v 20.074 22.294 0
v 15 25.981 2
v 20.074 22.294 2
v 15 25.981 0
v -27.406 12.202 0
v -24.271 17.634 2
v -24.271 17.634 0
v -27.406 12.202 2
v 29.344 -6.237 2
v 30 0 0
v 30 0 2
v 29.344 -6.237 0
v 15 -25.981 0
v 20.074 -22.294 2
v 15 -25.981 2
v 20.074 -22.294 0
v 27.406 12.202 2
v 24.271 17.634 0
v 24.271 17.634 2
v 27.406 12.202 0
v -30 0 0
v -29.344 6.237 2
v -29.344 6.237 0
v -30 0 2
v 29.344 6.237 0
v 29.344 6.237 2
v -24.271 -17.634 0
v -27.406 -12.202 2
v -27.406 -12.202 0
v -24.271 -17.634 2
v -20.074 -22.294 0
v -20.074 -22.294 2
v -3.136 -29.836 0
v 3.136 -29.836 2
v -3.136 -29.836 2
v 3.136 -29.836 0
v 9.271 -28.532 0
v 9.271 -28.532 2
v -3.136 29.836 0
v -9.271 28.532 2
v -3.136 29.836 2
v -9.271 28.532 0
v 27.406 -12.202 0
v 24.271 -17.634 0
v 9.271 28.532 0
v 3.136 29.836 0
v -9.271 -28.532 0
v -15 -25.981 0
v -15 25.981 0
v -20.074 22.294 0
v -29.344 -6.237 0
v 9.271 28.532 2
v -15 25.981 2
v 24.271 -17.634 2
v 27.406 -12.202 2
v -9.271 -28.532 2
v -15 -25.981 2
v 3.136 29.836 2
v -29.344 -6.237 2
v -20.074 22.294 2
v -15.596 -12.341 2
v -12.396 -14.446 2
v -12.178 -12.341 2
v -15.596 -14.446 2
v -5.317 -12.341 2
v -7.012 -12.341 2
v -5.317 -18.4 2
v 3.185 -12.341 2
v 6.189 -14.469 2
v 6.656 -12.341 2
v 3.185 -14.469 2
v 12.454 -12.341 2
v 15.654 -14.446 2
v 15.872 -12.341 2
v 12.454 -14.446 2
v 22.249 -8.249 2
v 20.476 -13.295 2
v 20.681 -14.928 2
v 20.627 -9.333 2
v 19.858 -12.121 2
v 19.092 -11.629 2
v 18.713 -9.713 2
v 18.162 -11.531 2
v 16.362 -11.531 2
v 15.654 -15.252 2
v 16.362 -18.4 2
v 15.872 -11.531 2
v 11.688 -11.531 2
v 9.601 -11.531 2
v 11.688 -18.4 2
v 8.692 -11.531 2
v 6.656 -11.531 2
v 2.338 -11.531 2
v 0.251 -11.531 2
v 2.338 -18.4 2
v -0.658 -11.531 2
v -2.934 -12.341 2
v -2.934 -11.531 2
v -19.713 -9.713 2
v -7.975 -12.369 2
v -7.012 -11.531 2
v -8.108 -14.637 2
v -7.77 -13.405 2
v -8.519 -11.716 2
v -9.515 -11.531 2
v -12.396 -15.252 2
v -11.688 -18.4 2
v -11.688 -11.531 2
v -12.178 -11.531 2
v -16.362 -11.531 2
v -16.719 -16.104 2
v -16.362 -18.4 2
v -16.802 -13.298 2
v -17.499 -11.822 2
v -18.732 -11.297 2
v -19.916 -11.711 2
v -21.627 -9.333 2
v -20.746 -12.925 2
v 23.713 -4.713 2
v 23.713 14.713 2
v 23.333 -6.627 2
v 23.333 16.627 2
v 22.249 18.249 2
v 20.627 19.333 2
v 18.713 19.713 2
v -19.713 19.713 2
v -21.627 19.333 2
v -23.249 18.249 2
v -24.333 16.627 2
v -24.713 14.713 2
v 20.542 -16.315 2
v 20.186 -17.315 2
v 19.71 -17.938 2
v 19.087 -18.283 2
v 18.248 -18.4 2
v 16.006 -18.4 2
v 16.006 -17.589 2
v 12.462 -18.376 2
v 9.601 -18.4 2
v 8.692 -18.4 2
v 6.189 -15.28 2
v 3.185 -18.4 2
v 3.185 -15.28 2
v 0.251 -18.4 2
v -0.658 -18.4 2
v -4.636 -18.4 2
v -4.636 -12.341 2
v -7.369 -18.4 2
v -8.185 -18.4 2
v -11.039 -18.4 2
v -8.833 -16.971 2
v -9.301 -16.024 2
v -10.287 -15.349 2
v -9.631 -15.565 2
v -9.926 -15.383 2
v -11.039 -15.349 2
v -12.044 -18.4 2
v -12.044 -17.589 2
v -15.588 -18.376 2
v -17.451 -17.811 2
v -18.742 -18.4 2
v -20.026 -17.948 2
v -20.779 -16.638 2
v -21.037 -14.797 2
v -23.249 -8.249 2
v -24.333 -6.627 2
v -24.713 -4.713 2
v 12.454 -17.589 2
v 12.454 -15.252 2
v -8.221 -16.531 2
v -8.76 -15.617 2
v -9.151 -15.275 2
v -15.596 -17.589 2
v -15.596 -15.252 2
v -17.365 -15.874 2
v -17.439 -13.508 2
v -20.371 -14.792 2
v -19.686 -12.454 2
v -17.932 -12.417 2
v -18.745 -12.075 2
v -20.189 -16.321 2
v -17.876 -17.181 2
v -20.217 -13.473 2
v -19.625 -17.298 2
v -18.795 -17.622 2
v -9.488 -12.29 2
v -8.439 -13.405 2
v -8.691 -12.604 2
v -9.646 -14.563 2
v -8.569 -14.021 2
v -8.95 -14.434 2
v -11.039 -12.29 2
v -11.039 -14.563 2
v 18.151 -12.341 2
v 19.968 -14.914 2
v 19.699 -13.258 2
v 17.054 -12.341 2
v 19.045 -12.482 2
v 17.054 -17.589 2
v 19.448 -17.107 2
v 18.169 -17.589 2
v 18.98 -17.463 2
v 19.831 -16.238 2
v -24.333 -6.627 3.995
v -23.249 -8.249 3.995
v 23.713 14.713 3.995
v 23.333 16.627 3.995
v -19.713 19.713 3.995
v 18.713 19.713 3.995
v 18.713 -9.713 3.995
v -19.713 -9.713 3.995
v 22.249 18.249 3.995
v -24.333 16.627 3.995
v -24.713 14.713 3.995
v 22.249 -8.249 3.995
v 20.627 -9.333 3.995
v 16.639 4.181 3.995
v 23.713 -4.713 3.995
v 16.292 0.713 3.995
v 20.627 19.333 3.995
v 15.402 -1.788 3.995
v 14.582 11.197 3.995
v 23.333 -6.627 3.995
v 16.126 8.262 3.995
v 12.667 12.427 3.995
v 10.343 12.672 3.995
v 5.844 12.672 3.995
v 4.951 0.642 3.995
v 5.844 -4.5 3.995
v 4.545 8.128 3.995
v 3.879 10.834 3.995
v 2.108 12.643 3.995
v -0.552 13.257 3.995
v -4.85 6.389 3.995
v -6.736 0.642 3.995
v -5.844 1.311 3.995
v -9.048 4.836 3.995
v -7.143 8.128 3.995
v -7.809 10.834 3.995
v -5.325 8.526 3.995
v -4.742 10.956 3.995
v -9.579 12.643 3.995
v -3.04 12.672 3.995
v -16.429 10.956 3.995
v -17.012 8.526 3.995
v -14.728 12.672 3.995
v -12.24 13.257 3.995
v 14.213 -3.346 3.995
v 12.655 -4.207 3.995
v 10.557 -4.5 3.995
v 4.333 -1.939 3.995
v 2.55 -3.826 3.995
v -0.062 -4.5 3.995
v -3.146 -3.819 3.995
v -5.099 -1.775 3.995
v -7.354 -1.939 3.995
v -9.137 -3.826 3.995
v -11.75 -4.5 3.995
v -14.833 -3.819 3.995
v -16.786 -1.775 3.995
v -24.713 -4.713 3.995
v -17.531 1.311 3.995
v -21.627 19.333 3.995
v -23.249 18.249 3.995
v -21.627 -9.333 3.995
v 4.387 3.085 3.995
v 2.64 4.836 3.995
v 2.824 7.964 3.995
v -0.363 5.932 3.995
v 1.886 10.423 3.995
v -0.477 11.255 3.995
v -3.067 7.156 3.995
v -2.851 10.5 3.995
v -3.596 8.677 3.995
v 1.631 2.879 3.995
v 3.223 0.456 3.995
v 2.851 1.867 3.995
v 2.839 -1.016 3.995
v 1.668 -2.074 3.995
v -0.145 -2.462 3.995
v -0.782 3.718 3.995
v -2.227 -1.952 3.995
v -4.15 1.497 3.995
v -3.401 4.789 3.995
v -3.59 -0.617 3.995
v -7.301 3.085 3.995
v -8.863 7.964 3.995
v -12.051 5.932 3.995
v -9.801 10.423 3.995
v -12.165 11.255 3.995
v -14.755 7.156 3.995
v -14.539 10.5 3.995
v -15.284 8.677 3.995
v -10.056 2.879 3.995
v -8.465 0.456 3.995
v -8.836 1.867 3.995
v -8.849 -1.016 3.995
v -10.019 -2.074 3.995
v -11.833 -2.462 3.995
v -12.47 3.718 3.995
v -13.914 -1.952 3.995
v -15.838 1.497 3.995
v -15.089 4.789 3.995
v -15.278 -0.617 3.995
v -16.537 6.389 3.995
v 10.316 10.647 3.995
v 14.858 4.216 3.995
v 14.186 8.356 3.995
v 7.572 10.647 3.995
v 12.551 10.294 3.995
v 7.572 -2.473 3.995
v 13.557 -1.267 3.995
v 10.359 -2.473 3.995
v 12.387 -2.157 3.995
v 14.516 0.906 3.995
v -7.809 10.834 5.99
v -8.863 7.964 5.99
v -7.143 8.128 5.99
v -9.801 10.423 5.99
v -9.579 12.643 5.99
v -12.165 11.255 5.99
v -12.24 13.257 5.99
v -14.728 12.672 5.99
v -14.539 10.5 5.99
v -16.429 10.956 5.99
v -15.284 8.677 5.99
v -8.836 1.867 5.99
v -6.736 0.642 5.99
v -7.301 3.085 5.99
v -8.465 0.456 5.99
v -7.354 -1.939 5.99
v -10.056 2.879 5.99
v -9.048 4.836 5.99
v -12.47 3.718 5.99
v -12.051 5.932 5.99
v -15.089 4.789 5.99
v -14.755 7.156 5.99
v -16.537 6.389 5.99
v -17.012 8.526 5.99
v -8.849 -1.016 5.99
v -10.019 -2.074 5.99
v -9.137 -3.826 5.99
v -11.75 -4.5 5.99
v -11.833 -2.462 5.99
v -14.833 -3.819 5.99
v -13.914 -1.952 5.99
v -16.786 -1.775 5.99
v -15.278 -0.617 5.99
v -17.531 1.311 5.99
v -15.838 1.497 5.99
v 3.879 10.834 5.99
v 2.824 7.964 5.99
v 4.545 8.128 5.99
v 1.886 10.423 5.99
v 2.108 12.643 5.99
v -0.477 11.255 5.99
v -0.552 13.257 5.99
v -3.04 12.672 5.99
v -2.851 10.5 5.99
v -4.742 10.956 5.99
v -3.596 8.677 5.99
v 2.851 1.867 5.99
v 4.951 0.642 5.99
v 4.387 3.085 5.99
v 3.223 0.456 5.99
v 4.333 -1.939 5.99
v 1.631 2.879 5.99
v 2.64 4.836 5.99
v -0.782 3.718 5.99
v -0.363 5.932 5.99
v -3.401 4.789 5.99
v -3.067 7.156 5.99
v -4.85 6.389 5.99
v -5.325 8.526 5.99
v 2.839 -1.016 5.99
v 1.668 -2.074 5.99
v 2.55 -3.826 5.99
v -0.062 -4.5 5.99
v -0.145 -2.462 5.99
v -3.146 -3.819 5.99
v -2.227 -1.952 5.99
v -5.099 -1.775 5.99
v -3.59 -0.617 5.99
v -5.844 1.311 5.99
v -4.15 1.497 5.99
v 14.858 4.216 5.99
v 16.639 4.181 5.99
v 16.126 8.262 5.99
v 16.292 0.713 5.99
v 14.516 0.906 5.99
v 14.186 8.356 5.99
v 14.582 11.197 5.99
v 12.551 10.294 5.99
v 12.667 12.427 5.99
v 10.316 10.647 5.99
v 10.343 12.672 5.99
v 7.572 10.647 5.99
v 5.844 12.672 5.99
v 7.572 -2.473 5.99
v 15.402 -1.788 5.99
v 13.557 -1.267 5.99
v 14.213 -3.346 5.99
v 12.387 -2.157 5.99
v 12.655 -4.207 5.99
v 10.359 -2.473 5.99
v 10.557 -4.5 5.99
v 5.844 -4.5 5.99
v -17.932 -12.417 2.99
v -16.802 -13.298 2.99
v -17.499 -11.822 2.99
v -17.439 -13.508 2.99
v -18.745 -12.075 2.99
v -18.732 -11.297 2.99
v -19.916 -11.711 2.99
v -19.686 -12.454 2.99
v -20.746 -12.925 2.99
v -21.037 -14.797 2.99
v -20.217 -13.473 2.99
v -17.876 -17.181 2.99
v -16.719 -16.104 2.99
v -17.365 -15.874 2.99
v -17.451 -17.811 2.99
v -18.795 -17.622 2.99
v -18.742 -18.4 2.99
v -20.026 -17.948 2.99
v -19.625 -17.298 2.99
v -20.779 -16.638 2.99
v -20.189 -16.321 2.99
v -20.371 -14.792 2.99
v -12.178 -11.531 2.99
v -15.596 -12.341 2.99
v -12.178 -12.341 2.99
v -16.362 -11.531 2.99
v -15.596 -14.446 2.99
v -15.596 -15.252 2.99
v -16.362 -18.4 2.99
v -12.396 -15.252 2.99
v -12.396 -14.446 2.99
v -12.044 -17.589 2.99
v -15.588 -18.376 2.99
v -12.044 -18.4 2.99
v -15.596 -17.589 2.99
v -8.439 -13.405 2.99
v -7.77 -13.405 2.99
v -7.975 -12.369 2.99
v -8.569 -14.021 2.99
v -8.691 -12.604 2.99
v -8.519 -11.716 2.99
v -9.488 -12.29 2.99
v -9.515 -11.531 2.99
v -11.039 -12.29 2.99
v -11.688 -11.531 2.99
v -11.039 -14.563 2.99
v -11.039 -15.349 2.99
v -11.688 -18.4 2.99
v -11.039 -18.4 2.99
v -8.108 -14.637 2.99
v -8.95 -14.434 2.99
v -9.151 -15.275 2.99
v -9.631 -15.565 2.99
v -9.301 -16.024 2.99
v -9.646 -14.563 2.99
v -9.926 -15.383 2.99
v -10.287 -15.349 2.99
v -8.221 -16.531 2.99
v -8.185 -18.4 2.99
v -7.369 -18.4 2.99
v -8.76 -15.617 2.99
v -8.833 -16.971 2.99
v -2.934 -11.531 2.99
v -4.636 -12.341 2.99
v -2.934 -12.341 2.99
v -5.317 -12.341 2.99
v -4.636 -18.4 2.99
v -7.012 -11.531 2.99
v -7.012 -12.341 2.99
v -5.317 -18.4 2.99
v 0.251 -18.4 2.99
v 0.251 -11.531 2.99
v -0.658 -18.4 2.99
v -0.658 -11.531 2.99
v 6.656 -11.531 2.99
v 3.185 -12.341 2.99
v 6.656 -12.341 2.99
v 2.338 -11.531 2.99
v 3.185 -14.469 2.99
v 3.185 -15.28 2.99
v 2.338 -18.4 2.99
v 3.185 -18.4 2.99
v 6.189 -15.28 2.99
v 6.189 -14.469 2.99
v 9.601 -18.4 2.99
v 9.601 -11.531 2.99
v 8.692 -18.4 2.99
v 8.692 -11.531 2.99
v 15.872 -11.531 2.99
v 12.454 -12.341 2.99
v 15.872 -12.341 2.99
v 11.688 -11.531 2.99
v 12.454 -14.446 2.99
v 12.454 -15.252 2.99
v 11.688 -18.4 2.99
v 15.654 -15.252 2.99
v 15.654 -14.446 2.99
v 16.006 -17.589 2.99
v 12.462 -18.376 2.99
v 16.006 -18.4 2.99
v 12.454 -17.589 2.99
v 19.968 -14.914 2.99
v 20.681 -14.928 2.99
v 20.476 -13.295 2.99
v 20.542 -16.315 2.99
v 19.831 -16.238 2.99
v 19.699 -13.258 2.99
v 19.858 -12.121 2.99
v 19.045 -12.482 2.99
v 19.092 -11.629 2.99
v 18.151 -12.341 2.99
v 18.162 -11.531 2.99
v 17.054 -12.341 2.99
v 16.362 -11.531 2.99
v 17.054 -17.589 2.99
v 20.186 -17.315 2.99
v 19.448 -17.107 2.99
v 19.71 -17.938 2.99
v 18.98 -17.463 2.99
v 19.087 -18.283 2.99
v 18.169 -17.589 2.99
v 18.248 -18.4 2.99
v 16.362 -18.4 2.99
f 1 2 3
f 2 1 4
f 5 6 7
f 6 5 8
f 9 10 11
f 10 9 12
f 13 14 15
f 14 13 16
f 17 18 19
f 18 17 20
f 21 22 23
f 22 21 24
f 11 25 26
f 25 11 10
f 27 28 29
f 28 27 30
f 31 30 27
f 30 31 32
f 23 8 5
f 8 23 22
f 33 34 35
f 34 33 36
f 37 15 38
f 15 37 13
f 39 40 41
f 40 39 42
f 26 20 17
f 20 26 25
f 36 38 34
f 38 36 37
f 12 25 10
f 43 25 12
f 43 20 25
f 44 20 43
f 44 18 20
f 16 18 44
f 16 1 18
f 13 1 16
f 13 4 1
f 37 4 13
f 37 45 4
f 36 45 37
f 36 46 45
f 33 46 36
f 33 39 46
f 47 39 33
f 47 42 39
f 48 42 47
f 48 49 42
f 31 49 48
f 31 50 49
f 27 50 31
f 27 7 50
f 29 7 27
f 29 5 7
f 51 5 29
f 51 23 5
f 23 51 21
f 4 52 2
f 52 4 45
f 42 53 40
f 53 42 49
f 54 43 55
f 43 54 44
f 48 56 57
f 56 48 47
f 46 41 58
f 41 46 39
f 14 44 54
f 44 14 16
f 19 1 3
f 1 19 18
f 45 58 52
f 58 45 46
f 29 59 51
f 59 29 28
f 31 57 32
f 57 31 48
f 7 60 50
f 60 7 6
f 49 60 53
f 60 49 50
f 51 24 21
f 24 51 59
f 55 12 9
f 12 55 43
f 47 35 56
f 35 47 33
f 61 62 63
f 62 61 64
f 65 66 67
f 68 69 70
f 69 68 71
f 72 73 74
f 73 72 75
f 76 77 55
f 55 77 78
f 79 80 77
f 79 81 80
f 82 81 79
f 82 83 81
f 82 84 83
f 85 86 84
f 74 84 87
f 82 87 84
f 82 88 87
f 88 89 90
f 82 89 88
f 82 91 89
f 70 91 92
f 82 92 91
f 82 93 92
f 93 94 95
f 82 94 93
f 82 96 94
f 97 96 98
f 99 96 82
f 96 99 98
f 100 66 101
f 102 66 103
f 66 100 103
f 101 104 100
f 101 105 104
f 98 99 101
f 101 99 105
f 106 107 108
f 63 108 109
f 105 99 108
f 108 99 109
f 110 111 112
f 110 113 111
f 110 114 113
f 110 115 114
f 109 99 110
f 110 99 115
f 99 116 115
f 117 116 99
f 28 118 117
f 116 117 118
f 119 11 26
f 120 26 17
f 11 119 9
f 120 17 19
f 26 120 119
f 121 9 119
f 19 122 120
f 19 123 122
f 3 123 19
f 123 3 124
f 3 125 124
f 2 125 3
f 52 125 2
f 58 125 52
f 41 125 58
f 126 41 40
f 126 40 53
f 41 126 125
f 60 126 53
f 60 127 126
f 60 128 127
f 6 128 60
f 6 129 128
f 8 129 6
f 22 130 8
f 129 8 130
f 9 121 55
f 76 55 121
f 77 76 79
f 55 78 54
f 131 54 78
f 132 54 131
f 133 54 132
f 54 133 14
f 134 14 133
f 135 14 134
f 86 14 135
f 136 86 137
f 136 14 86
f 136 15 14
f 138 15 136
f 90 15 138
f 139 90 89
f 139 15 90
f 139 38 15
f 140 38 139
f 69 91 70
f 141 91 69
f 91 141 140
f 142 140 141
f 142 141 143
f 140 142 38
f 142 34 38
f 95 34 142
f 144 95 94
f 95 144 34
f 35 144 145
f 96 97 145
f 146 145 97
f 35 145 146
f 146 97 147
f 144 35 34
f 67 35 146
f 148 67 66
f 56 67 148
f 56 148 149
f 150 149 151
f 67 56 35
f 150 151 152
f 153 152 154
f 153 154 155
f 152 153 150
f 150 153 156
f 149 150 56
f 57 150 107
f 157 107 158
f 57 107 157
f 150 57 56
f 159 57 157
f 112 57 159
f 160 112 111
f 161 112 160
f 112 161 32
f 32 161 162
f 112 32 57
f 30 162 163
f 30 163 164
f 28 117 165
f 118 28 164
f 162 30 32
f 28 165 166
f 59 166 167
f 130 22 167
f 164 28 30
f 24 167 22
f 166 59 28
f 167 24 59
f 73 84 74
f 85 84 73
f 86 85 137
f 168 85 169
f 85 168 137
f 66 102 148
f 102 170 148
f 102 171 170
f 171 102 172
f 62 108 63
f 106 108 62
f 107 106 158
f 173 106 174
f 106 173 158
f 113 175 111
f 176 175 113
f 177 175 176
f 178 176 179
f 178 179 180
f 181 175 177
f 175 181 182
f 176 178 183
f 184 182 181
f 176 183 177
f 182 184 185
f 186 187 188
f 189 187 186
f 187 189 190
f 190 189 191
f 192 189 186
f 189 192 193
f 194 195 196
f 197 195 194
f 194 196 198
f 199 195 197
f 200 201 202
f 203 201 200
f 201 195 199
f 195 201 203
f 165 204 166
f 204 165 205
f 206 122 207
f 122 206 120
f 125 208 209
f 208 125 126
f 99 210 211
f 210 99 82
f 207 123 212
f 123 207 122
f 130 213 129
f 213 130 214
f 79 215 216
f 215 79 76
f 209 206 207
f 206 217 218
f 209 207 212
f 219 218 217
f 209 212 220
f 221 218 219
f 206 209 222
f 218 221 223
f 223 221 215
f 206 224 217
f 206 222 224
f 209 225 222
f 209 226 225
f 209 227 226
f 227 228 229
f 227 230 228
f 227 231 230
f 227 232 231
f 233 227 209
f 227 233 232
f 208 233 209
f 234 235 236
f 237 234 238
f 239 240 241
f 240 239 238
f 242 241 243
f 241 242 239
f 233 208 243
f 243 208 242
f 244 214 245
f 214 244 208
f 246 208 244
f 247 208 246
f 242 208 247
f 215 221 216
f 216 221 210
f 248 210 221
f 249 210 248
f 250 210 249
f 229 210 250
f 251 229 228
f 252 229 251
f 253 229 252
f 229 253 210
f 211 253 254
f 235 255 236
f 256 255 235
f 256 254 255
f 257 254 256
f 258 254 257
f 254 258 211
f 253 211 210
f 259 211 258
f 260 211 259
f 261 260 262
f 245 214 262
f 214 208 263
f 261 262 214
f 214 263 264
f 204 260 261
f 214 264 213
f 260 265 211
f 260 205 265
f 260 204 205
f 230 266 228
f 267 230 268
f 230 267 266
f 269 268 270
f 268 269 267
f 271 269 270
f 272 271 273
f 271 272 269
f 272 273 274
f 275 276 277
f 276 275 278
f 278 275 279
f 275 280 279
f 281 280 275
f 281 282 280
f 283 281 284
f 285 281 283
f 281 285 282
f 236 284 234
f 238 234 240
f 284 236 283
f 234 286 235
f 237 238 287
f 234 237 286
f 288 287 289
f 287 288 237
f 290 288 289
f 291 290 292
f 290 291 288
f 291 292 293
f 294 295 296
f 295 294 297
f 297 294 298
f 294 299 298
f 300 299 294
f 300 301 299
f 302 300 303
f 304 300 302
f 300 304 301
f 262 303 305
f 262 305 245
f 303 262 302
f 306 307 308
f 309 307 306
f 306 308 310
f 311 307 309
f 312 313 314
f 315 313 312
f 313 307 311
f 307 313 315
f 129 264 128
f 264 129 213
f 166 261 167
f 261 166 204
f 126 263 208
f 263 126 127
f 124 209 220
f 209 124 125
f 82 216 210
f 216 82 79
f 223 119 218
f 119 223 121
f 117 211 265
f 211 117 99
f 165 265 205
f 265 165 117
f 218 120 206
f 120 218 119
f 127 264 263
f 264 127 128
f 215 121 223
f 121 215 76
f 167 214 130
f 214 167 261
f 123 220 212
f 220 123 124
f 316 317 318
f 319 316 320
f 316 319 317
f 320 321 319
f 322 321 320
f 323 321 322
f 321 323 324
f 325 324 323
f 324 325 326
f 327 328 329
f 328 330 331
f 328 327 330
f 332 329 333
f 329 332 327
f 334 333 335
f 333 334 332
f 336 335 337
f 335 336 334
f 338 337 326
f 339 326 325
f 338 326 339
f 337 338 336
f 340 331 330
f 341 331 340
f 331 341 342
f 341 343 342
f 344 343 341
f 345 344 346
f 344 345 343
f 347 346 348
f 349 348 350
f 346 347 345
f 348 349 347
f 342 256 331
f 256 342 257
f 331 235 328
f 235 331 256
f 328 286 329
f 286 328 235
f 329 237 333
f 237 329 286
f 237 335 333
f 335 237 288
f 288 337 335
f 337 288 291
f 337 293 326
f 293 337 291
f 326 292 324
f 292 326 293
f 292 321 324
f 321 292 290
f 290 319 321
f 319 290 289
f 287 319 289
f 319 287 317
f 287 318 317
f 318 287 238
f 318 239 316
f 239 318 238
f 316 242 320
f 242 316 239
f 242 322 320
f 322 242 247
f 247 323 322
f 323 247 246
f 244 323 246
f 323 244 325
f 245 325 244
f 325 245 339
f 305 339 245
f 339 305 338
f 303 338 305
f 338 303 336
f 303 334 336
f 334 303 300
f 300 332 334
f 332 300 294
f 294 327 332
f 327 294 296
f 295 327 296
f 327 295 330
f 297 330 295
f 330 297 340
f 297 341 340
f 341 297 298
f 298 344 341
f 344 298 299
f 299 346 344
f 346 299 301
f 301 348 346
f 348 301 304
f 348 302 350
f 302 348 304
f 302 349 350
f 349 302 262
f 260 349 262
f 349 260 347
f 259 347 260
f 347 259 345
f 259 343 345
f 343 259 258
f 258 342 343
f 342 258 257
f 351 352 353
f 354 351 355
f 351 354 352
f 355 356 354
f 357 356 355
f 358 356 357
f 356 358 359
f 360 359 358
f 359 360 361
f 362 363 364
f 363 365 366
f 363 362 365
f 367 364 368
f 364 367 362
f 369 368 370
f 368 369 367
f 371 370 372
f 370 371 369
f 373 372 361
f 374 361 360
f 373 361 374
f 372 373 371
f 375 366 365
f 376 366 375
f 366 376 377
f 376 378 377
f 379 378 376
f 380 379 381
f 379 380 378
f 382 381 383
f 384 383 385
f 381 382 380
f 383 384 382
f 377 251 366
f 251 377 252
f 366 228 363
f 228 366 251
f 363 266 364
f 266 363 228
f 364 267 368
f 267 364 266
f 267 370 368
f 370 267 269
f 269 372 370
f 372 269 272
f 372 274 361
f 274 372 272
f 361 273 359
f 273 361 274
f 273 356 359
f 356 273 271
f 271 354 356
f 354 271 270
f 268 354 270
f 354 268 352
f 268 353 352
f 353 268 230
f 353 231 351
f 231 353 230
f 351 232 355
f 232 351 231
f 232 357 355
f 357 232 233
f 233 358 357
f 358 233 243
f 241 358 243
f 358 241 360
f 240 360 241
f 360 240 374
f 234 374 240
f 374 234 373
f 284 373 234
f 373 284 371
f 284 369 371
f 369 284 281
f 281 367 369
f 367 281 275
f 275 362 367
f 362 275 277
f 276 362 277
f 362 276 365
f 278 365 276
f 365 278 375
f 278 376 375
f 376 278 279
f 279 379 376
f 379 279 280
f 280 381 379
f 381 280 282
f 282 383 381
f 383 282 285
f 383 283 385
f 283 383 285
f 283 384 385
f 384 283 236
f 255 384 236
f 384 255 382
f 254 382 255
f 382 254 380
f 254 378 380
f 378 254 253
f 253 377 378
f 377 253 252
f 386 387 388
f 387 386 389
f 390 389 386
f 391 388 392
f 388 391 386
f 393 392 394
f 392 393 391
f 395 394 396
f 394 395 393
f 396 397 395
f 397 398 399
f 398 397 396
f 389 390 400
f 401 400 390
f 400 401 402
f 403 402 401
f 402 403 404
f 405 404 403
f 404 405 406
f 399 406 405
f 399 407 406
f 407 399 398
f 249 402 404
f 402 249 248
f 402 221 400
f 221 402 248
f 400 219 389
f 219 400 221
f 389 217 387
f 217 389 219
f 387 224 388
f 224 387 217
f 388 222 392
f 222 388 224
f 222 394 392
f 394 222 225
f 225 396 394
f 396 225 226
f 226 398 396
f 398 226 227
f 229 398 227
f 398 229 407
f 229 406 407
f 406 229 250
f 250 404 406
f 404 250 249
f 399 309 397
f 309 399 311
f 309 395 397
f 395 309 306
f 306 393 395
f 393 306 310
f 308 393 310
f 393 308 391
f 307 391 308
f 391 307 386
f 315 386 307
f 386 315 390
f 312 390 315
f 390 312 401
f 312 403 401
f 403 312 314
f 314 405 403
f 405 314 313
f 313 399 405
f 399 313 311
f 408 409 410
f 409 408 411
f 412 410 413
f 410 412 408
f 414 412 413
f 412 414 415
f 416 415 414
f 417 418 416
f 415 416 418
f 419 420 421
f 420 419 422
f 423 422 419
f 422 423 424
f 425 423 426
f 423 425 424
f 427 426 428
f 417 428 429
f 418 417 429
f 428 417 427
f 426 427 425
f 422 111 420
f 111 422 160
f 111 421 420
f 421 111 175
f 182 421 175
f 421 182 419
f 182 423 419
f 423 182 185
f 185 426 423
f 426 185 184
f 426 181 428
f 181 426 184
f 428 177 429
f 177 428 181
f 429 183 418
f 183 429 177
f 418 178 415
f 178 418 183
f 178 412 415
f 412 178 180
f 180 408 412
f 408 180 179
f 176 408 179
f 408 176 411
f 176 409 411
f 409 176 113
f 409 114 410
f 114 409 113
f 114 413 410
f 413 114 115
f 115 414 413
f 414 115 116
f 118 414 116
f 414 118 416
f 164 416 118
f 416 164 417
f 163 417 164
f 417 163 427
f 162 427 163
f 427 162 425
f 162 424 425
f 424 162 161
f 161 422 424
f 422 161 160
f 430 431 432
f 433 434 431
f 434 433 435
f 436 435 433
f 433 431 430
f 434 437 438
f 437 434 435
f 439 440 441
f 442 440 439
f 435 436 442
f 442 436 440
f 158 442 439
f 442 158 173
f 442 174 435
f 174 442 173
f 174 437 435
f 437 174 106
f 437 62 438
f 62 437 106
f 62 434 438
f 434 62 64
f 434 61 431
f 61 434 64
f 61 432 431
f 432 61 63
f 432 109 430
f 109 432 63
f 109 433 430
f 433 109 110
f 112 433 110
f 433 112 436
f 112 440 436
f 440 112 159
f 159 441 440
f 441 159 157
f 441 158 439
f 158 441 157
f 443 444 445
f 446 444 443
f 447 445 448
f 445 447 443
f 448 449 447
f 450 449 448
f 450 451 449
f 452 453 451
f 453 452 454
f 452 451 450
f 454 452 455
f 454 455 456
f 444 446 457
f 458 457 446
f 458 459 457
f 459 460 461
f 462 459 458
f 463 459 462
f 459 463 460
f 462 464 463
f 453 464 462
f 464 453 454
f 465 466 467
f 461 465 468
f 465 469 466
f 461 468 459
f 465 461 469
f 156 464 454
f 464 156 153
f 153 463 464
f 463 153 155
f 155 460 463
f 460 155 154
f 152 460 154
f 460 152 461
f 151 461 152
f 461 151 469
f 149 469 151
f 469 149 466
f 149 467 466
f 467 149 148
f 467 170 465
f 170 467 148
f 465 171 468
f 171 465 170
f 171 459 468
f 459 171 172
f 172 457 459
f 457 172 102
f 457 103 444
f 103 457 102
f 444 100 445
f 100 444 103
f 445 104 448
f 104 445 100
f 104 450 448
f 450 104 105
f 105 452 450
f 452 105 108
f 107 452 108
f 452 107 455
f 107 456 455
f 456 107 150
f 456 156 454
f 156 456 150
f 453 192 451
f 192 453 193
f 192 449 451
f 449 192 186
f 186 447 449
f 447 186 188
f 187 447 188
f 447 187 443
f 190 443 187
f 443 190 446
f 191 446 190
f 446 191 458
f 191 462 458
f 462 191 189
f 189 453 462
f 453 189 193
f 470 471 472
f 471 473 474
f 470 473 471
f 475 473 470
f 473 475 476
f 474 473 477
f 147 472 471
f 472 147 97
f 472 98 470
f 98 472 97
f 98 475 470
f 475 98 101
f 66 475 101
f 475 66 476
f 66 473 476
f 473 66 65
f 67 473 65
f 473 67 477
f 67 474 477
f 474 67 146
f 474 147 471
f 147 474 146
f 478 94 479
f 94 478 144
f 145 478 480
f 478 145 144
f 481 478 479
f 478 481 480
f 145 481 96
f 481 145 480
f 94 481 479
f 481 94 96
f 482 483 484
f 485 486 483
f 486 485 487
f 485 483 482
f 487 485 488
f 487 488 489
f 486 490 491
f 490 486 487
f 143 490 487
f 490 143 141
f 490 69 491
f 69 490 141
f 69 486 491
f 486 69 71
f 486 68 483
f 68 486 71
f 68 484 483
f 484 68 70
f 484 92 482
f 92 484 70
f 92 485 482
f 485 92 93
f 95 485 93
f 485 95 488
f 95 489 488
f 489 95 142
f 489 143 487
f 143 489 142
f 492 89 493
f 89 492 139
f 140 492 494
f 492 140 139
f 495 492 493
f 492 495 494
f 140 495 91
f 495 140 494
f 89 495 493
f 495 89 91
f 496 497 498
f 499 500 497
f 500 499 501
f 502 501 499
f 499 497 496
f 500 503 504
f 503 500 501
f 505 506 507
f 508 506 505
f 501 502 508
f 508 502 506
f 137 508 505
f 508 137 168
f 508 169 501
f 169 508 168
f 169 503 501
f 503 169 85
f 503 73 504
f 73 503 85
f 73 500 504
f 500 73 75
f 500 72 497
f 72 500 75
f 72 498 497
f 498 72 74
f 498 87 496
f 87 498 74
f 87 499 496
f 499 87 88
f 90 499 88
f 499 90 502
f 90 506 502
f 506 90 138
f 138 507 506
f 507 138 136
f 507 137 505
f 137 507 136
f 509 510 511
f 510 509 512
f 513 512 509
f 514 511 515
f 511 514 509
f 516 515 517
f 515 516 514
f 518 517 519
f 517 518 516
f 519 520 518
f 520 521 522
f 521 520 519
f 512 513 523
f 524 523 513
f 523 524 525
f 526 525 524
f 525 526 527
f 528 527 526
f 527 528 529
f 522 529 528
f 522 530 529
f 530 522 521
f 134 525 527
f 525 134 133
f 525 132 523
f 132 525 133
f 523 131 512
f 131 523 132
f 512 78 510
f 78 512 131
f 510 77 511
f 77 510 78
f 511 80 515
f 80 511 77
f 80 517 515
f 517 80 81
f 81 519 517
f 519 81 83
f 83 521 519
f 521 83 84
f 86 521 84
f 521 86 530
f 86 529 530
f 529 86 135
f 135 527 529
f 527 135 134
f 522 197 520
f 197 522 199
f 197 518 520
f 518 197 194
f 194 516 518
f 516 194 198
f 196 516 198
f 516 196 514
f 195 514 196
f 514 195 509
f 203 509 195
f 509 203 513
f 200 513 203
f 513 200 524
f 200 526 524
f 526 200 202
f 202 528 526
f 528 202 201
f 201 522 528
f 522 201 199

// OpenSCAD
include <Write.scad>

radius = 30;
size = 2 * radius * cos(45) - 3;
thickness = 2;
font_size = 17;
o = 0.01;

SSD_Emblem();

module SSD_Emblem() {
	union() {
		EmblemBase();
		translate([0, 4, thickness * 2 - o]) SSD();
		translate([0, -15, thickness * 1 - o]) certified();
	}
}

module EmblemBase() {
	translate([0, 0, 0]) cylinder(r = radius, h = thickness);
	minkowski() {
		translate([-size / 2, -size / 2 + 10 + 5, thickness - o]) cube([size - 1, size - 10 - 10, thickness]);
		rotate([0, 0, 90]) cylinder(r = 5, h = 0.01, center = true);
	}
}

module SSD() {
	write("SSD", t = 4, h = font_size, center = true);
}

module certified() {
	write("CERTIFIED", t = 2, h = font_size / 2.5, center = true);
}
